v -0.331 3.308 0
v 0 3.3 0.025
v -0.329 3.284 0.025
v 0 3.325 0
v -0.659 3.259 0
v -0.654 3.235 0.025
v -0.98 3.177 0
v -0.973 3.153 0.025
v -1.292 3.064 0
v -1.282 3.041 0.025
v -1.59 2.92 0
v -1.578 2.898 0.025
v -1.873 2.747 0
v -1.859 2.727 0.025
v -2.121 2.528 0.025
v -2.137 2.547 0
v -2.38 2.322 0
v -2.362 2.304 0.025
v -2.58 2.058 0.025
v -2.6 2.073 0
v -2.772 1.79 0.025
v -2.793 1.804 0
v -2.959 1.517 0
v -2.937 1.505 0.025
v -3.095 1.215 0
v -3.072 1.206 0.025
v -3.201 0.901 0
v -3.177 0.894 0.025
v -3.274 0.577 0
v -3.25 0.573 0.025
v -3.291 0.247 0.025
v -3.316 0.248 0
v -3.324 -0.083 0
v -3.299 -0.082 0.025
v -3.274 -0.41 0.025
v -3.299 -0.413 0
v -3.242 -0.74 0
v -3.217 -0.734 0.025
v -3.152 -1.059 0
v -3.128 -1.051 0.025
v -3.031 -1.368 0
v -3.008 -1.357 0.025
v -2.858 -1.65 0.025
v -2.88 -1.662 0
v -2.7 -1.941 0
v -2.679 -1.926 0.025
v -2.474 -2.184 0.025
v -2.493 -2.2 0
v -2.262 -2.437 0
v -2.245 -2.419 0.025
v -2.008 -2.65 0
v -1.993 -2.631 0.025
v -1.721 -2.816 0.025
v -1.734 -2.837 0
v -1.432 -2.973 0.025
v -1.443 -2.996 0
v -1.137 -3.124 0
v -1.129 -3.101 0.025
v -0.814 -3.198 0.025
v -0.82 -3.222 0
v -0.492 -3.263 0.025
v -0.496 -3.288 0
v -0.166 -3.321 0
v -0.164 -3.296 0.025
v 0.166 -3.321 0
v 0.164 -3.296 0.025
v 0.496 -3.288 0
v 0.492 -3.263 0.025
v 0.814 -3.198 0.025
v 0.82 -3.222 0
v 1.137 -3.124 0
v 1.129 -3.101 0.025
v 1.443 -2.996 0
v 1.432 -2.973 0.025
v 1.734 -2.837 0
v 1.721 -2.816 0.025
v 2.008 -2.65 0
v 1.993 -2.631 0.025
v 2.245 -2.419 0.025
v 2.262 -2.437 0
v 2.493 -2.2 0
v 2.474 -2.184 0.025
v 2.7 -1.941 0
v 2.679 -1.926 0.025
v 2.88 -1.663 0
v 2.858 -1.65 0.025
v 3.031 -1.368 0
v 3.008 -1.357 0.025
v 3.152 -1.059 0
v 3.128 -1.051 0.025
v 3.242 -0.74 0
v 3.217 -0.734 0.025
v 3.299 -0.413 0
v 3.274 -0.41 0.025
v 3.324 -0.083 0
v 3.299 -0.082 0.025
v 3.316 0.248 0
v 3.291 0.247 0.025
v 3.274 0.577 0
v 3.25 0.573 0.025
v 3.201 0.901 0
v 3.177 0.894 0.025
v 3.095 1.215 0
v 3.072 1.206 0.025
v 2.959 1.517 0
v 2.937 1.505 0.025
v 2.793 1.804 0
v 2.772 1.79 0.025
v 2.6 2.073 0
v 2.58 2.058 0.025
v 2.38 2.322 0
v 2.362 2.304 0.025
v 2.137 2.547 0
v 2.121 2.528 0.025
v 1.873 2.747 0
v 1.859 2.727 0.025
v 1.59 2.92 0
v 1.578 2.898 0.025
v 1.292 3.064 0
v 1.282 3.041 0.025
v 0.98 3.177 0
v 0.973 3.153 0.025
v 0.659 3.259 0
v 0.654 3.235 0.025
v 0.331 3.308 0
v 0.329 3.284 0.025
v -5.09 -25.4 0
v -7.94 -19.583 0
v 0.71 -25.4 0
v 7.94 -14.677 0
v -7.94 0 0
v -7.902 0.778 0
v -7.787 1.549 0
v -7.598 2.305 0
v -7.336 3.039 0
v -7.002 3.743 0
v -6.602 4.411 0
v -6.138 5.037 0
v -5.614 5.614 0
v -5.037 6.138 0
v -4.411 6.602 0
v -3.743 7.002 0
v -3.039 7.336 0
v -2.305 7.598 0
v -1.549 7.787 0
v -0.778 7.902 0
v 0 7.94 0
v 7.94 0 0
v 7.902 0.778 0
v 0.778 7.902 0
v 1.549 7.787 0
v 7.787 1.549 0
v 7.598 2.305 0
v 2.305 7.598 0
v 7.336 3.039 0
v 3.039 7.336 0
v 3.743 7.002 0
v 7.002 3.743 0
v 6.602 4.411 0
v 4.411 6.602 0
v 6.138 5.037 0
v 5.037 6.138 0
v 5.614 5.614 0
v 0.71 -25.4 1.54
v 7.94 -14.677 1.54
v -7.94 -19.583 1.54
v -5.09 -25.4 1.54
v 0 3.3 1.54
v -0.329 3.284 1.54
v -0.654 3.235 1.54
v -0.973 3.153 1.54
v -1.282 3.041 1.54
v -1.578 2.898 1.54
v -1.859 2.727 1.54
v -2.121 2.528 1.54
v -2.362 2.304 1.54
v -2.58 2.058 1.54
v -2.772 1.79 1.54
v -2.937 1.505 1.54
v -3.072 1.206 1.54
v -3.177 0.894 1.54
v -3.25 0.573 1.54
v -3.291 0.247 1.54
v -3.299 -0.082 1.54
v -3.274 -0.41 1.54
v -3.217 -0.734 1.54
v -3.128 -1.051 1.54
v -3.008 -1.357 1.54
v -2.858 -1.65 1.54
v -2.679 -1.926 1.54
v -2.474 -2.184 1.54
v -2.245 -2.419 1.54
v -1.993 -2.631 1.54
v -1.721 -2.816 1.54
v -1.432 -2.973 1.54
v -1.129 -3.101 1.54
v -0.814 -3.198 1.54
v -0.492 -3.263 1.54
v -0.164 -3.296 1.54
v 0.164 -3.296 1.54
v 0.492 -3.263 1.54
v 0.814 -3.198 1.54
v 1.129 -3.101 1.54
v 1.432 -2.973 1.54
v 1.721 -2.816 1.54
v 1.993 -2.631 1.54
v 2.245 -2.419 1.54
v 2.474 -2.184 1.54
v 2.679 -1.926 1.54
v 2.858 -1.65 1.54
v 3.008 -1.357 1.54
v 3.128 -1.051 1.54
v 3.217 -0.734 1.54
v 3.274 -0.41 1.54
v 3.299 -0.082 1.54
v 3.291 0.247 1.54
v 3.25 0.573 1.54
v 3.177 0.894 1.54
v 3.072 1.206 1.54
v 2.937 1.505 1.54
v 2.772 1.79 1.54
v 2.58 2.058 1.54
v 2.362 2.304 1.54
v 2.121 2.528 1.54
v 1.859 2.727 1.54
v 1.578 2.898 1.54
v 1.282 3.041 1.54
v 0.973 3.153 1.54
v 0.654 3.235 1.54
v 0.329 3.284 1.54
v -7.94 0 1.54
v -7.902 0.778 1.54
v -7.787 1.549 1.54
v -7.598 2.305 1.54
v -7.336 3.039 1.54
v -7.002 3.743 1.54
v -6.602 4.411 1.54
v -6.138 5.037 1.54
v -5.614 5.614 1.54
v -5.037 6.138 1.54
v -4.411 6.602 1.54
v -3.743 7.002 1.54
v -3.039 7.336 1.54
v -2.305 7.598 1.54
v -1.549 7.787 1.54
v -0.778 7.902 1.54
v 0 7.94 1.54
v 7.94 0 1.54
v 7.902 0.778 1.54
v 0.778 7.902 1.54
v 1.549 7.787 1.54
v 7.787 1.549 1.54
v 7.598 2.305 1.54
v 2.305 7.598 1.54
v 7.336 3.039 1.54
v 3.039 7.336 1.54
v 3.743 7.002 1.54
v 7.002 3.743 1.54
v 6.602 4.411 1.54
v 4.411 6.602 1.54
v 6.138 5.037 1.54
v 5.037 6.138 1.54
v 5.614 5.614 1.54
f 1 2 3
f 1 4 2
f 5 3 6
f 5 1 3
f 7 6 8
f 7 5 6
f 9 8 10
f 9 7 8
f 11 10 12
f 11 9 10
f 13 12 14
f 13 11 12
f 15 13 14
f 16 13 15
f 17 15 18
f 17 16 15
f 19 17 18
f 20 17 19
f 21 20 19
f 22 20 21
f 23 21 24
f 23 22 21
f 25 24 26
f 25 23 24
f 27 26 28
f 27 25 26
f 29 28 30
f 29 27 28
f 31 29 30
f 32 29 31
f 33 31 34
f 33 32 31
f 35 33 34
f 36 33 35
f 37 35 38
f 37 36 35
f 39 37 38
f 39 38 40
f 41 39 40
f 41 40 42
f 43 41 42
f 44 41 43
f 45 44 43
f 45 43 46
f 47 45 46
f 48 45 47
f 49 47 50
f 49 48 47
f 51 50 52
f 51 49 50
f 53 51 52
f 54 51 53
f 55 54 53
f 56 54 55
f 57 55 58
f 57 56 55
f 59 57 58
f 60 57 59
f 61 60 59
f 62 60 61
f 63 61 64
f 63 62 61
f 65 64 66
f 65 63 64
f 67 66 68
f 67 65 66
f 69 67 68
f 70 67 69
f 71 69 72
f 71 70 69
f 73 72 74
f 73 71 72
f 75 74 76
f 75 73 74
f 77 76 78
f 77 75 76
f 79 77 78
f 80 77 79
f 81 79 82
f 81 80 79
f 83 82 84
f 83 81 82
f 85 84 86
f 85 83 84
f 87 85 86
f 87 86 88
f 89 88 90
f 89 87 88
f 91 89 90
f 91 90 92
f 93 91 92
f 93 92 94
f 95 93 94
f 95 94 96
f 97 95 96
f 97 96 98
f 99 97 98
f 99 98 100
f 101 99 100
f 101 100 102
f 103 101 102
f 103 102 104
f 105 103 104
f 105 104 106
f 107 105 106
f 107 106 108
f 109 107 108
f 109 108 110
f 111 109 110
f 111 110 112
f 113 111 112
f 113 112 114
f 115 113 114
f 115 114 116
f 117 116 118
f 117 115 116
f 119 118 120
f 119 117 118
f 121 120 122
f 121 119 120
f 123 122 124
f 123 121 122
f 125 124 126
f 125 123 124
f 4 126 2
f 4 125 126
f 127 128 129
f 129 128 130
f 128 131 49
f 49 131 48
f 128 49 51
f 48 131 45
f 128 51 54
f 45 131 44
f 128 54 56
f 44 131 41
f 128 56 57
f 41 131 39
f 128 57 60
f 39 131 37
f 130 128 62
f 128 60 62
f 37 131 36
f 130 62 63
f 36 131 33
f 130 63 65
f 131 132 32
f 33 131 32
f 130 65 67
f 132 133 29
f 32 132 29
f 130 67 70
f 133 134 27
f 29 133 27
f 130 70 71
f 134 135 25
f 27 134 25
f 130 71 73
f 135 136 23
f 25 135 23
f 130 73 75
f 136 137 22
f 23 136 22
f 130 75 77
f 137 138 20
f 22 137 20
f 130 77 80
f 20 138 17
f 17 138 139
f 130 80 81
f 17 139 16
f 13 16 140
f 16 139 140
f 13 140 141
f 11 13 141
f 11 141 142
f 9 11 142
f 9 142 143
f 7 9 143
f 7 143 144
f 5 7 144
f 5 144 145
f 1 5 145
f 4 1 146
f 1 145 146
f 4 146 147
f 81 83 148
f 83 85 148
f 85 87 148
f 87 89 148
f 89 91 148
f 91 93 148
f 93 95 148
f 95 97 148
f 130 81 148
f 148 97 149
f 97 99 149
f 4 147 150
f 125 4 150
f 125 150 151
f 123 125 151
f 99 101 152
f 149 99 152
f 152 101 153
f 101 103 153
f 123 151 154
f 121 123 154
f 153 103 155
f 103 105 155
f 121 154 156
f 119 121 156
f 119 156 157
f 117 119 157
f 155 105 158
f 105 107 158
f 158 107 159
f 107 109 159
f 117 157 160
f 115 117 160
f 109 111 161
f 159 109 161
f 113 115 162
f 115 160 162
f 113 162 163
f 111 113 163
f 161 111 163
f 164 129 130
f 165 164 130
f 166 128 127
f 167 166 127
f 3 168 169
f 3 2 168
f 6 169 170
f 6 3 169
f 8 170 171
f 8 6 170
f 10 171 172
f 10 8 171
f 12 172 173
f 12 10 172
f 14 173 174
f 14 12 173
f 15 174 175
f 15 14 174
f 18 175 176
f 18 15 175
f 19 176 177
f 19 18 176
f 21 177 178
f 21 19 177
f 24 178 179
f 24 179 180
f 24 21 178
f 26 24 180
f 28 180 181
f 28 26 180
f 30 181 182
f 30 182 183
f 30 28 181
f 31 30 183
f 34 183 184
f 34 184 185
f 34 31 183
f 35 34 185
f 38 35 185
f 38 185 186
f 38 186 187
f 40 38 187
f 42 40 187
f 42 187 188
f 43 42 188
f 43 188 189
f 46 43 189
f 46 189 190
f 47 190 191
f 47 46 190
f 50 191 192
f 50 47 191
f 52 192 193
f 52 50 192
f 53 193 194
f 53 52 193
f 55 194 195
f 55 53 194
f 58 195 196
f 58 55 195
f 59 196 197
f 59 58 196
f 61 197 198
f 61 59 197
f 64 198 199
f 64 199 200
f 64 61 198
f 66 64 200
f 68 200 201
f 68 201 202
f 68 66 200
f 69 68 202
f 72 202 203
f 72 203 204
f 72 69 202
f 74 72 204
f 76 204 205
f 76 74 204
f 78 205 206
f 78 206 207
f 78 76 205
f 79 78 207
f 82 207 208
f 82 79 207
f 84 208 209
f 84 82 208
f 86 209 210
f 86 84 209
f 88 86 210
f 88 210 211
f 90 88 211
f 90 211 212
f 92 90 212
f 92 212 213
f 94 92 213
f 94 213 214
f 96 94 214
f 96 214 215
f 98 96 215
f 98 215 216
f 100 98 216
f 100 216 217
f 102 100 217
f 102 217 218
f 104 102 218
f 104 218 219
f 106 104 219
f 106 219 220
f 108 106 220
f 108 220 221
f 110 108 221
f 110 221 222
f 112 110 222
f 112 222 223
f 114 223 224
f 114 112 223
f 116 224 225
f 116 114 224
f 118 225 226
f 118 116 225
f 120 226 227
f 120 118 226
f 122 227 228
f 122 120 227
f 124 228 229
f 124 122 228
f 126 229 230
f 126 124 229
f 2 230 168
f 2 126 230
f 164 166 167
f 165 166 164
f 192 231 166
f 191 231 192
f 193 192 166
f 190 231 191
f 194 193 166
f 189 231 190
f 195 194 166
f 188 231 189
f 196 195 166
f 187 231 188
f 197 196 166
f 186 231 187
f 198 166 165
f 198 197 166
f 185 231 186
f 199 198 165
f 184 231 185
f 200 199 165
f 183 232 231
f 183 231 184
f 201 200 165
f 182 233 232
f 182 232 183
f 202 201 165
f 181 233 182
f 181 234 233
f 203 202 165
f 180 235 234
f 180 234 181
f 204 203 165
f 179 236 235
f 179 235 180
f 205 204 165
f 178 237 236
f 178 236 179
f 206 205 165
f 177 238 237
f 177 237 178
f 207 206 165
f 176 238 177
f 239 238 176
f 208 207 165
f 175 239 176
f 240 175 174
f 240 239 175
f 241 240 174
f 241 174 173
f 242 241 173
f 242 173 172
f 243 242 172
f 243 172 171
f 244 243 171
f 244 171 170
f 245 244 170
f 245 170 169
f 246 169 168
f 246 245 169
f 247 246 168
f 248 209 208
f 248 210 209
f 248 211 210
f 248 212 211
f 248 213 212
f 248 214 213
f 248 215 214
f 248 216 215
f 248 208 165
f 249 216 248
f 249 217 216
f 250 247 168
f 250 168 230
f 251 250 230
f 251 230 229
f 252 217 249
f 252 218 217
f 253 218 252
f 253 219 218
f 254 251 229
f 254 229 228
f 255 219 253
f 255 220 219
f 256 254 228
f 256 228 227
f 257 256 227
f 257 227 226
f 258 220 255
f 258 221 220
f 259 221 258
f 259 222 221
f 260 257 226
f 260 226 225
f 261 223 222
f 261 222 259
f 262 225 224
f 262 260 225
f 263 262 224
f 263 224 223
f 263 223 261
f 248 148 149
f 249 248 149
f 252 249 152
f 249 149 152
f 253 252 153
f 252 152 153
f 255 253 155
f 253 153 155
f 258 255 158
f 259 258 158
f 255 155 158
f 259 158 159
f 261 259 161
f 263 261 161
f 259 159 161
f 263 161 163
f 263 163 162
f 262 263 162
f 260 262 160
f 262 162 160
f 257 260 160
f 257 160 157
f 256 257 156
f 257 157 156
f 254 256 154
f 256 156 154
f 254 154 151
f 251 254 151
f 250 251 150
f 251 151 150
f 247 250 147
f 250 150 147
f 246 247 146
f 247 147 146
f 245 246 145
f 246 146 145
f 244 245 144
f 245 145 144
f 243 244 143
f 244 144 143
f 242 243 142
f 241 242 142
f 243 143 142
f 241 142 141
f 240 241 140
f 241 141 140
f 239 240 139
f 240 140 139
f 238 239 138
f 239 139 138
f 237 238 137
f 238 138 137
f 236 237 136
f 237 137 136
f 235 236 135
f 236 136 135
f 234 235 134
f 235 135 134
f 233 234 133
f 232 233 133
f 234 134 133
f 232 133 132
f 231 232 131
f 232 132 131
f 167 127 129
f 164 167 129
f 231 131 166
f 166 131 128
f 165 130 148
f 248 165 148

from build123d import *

# Parameters (mm, degrees)
BOSS_EXTRUDE1_DEPTH = 1.54


with BuildPart() as part:
    # Sketch1 → Boss-Extrude1 (new body)
    with BuildSketch(Plane.XY):
        with BuildLine():
            Line((7.939999995, -14.676928872), (7.939999995, 0))
            ThreePointArc((7.939999995, 0), (0, 7.939999995), (-7.939999995, 0))
            Line((-7.939999995, 0), (-7.939999995, -19.583493141))
            Line((-7.939999995, -19.583493141), (-5.090371955, -25.4))
            Line((-5.090371955, -25.4), (0.709510618, -25.4))
            Line((0.709510618, -25.4), (7.939999995, -14.676928872))
        make_face()
    extrude(amount=BOSS_EXTRUDE1_DEPTH)

    # Sketch3 → M6 Clearance Hole1 (revolve, cut)
    with BuildSketch(Plane.YZ):
        Polygon((0, 0), (0, 1.54), (3.3, 1.54), (3.3, 0.025), (3.325, 0), align=None)
    revolve(axis=Axis((0, 0, -6.35), (0, 0, 1)), mode=Mode.SUBTRACT)


solid = part.part
